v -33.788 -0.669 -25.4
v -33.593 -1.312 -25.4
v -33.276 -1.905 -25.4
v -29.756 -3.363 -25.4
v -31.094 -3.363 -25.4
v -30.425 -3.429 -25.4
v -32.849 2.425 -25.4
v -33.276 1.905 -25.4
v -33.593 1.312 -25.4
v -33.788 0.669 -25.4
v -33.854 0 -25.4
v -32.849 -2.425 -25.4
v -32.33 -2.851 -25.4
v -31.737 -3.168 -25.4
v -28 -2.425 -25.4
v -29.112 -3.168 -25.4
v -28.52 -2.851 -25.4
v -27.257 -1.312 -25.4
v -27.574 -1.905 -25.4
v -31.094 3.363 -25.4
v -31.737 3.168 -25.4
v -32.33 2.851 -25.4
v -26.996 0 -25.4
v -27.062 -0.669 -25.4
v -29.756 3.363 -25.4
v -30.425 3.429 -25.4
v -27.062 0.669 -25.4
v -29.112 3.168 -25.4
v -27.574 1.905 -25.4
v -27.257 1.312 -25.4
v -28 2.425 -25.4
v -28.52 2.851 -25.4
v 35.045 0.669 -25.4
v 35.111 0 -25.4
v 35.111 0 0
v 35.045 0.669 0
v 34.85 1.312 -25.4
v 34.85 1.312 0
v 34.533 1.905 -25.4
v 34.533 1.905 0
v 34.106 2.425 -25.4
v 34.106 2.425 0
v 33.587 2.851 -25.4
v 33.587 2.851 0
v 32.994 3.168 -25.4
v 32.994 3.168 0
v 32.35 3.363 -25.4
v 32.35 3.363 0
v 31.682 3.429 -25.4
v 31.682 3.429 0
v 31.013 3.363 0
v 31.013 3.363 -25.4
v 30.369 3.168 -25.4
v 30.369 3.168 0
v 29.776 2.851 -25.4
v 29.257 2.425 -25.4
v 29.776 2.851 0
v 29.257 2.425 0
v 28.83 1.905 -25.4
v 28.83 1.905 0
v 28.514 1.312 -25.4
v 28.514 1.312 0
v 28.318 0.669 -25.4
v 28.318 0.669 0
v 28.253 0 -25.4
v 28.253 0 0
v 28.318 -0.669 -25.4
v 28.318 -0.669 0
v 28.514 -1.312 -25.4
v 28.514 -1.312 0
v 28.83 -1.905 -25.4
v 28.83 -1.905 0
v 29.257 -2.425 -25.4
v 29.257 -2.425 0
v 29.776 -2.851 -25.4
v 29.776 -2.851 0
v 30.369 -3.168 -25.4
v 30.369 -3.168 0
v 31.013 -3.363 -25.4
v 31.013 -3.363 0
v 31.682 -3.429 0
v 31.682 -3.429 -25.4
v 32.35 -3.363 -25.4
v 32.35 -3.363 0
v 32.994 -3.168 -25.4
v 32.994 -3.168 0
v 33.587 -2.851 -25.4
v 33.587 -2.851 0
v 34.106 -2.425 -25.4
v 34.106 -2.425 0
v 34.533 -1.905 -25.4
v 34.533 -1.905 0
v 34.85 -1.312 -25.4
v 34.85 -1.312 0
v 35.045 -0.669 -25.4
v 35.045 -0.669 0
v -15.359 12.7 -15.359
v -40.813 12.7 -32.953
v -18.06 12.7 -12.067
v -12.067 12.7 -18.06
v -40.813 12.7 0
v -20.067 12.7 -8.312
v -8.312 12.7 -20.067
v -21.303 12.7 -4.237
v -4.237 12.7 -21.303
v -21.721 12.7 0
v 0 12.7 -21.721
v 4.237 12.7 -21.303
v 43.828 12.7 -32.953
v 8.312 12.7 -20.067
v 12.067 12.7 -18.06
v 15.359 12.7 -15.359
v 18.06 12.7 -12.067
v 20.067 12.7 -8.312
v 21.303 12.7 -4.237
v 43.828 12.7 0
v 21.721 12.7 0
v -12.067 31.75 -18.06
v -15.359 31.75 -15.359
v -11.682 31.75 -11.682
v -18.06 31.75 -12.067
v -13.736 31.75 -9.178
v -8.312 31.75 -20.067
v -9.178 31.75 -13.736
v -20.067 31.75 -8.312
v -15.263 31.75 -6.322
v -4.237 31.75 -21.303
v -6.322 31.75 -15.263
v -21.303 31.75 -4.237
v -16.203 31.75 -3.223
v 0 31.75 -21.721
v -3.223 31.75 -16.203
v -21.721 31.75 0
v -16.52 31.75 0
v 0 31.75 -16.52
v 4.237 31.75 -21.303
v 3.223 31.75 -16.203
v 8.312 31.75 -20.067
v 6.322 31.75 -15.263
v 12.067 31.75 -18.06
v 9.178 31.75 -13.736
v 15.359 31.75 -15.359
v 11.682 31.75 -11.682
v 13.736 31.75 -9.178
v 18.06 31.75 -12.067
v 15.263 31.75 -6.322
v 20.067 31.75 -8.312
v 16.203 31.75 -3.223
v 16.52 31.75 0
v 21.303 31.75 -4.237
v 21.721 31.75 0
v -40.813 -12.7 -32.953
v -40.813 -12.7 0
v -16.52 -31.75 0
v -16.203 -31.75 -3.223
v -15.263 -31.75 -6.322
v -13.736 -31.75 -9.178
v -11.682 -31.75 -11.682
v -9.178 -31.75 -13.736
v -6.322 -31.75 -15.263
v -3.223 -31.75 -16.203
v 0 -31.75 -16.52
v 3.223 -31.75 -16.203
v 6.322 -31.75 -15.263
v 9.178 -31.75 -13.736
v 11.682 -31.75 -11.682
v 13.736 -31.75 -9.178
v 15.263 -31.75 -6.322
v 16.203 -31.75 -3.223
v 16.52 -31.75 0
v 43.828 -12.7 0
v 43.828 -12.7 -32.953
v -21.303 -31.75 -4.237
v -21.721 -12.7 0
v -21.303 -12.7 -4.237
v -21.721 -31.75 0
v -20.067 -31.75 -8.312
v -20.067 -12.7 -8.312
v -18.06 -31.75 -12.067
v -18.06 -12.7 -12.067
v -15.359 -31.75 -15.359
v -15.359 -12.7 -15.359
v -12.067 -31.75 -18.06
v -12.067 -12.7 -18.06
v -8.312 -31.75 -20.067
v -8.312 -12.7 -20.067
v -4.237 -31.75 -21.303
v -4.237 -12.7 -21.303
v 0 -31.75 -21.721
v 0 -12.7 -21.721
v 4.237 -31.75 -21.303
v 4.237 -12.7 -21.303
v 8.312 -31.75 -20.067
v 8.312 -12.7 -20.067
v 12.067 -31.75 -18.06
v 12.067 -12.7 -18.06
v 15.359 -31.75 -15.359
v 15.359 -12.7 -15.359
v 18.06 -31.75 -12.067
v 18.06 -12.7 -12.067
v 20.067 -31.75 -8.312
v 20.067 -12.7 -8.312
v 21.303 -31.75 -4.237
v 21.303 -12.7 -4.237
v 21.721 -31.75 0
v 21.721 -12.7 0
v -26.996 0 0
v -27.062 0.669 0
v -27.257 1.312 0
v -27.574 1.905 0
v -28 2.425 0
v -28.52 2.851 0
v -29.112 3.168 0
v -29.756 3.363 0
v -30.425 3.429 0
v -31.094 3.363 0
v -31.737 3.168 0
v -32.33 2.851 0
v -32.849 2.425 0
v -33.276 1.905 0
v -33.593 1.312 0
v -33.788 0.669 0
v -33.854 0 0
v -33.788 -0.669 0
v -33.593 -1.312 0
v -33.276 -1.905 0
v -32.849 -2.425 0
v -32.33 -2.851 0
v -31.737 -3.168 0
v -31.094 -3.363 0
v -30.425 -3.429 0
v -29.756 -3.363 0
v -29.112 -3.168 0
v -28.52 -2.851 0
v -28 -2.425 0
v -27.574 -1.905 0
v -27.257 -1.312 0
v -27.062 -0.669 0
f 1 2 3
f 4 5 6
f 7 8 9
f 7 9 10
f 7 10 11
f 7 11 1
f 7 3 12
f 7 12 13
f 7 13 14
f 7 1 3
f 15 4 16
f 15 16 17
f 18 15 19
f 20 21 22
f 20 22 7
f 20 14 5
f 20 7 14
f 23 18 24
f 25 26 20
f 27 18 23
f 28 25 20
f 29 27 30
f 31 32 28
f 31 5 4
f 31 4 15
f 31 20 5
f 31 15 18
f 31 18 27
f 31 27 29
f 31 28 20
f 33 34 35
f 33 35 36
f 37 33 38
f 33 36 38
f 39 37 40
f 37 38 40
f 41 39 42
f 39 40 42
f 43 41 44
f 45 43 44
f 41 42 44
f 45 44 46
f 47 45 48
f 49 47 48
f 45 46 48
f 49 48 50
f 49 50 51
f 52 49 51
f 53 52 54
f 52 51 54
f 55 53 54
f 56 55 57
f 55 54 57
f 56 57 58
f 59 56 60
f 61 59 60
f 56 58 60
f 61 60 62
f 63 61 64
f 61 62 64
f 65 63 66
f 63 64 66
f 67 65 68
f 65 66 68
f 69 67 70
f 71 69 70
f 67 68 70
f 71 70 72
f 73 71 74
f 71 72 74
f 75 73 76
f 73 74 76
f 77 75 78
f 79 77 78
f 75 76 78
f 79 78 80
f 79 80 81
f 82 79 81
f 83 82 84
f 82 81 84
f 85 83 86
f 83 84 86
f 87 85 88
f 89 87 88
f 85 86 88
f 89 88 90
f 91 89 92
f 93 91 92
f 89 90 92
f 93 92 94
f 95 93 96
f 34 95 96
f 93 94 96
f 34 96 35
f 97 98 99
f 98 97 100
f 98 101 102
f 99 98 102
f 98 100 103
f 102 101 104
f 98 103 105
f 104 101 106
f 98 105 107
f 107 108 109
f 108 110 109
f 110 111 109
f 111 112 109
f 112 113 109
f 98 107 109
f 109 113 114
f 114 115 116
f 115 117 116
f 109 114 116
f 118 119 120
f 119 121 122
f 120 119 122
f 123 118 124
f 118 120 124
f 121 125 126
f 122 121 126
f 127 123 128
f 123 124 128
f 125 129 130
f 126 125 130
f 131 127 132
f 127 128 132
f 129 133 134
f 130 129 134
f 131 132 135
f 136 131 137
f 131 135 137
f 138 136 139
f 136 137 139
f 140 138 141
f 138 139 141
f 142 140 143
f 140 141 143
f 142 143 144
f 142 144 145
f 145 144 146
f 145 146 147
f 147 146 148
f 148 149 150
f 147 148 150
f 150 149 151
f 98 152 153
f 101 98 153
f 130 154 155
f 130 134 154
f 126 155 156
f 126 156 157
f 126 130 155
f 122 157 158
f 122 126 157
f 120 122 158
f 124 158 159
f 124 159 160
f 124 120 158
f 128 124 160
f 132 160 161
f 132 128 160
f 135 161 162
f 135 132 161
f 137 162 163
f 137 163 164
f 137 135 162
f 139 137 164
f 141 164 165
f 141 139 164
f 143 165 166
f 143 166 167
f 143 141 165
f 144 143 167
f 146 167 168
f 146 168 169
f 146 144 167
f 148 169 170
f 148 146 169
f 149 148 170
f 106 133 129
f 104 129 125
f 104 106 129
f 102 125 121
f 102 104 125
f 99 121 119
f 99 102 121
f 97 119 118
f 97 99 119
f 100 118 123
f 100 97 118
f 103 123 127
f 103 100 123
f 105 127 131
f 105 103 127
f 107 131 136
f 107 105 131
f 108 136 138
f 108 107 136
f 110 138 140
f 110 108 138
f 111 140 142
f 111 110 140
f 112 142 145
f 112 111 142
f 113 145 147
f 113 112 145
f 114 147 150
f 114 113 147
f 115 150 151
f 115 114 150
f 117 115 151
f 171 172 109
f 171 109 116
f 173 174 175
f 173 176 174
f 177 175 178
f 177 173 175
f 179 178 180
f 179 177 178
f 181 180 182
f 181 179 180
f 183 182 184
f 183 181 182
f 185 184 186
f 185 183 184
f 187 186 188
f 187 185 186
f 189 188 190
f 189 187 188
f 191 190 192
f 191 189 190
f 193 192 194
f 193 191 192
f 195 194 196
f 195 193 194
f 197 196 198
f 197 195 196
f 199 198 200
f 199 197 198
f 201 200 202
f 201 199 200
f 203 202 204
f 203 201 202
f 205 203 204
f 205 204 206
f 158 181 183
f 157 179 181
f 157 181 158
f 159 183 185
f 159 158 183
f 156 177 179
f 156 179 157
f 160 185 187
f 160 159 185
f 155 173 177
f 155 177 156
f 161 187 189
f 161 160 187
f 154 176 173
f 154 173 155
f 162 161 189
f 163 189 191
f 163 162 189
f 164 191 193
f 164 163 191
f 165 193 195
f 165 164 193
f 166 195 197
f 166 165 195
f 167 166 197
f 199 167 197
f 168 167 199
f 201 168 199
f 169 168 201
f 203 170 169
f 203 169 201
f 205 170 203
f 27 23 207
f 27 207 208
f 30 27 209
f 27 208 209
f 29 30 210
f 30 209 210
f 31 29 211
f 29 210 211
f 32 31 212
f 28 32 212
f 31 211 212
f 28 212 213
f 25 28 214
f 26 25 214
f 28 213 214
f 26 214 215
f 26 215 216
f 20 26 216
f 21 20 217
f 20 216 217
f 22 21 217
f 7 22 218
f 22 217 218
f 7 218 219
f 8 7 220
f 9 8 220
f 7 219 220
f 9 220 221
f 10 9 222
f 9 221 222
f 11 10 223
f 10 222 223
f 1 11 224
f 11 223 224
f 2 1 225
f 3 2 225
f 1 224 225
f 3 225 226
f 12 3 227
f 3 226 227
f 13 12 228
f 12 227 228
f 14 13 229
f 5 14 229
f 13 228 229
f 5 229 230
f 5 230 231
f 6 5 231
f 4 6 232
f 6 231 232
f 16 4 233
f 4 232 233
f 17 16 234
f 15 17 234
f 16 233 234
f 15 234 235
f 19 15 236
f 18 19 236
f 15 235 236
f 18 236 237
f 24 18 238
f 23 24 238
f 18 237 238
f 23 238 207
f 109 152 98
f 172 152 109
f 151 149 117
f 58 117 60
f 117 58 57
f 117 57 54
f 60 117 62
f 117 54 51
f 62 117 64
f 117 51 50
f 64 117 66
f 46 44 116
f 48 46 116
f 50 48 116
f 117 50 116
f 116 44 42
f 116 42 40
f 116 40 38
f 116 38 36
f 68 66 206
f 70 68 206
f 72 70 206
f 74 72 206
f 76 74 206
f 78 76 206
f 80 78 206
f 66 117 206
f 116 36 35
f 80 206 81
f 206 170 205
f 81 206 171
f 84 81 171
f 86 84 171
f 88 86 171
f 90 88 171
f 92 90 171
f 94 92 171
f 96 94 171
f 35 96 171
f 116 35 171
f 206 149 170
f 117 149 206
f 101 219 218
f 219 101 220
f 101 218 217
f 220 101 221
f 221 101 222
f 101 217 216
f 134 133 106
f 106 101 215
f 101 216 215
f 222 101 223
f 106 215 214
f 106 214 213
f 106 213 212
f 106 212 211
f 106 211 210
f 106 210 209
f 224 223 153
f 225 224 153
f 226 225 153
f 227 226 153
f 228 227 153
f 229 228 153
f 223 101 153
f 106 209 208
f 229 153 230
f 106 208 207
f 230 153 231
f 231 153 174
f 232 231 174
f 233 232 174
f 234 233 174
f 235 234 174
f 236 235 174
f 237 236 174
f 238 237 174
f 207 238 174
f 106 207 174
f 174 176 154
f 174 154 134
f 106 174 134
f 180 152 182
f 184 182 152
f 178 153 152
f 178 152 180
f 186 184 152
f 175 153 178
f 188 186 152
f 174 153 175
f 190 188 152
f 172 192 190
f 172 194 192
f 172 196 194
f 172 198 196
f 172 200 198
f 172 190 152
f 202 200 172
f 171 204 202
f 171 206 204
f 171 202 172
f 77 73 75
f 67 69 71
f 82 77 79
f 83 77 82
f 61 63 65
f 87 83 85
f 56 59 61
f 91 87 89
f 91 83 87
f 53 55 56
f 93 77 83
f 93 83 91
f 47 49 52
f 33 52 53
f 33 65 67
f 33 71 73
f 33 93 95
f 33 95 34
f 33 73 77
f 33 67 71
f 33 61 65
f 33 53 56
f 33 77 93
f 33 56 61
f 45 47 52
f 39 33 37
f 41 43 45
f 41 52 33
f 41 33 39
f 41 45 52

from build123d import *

# Parameters (mm, degrees)
F0_R     = 21.720665
F0_R_2   = 16.520494
F1_DEPTH = 31.75
F0_W     = 84.640459
F0_H     = 65.472521
F2_DEPTH = 12.7
F3_W     = 86.387612
F3_H     = 35.076849
F4_DEPTH = 31.75
F5_R     = 3.429
F6_DEPTH = 25.4


with BuildPart() as f1:
    # F0 (on Front) → F1 (new body, symmetric)
    with BuildSketch(Plane.XZ):
        Circle(F0_R)
        Circle(F0_R_2, mode=Mode.SUBTRACT)
    extrude(amount=F1_DEPTH, both=True)

    # F0 (on Front) → F2 (join, symmetric)
    with BuildSketch(Plane.XZ):
        with Locations((1.507592, -0.216593)):
            Rectangle(F0_W, F0_H)
        Circle(F0_R, mode=Mode.SUBTRACT)
    extrude(amount=F2_DEPTH, both=True)

    # F3 (on Front) → F4 (cut, symmetric)
    with BuildSketch(Plane.XZ):
        with Locations((2.319131, 17.538424)):
            Rectangle(F3_W, F3_H)
    extrude(amount=F4_DEPTH, both=True, mode=Mode.SUBTRACT)

    # F5 (on face) → F6 (cut)
    with BuildSketch(Plane.XY):
        with Locations((-30.424622, 0)):
            Circle(F5_R)
        with Locations((31.681519, 0)):
            Circle(F5_R)
    extrude(amount=-F6_DEPTH, mode=Mode.SUBTRACT)


solid = f1.part
